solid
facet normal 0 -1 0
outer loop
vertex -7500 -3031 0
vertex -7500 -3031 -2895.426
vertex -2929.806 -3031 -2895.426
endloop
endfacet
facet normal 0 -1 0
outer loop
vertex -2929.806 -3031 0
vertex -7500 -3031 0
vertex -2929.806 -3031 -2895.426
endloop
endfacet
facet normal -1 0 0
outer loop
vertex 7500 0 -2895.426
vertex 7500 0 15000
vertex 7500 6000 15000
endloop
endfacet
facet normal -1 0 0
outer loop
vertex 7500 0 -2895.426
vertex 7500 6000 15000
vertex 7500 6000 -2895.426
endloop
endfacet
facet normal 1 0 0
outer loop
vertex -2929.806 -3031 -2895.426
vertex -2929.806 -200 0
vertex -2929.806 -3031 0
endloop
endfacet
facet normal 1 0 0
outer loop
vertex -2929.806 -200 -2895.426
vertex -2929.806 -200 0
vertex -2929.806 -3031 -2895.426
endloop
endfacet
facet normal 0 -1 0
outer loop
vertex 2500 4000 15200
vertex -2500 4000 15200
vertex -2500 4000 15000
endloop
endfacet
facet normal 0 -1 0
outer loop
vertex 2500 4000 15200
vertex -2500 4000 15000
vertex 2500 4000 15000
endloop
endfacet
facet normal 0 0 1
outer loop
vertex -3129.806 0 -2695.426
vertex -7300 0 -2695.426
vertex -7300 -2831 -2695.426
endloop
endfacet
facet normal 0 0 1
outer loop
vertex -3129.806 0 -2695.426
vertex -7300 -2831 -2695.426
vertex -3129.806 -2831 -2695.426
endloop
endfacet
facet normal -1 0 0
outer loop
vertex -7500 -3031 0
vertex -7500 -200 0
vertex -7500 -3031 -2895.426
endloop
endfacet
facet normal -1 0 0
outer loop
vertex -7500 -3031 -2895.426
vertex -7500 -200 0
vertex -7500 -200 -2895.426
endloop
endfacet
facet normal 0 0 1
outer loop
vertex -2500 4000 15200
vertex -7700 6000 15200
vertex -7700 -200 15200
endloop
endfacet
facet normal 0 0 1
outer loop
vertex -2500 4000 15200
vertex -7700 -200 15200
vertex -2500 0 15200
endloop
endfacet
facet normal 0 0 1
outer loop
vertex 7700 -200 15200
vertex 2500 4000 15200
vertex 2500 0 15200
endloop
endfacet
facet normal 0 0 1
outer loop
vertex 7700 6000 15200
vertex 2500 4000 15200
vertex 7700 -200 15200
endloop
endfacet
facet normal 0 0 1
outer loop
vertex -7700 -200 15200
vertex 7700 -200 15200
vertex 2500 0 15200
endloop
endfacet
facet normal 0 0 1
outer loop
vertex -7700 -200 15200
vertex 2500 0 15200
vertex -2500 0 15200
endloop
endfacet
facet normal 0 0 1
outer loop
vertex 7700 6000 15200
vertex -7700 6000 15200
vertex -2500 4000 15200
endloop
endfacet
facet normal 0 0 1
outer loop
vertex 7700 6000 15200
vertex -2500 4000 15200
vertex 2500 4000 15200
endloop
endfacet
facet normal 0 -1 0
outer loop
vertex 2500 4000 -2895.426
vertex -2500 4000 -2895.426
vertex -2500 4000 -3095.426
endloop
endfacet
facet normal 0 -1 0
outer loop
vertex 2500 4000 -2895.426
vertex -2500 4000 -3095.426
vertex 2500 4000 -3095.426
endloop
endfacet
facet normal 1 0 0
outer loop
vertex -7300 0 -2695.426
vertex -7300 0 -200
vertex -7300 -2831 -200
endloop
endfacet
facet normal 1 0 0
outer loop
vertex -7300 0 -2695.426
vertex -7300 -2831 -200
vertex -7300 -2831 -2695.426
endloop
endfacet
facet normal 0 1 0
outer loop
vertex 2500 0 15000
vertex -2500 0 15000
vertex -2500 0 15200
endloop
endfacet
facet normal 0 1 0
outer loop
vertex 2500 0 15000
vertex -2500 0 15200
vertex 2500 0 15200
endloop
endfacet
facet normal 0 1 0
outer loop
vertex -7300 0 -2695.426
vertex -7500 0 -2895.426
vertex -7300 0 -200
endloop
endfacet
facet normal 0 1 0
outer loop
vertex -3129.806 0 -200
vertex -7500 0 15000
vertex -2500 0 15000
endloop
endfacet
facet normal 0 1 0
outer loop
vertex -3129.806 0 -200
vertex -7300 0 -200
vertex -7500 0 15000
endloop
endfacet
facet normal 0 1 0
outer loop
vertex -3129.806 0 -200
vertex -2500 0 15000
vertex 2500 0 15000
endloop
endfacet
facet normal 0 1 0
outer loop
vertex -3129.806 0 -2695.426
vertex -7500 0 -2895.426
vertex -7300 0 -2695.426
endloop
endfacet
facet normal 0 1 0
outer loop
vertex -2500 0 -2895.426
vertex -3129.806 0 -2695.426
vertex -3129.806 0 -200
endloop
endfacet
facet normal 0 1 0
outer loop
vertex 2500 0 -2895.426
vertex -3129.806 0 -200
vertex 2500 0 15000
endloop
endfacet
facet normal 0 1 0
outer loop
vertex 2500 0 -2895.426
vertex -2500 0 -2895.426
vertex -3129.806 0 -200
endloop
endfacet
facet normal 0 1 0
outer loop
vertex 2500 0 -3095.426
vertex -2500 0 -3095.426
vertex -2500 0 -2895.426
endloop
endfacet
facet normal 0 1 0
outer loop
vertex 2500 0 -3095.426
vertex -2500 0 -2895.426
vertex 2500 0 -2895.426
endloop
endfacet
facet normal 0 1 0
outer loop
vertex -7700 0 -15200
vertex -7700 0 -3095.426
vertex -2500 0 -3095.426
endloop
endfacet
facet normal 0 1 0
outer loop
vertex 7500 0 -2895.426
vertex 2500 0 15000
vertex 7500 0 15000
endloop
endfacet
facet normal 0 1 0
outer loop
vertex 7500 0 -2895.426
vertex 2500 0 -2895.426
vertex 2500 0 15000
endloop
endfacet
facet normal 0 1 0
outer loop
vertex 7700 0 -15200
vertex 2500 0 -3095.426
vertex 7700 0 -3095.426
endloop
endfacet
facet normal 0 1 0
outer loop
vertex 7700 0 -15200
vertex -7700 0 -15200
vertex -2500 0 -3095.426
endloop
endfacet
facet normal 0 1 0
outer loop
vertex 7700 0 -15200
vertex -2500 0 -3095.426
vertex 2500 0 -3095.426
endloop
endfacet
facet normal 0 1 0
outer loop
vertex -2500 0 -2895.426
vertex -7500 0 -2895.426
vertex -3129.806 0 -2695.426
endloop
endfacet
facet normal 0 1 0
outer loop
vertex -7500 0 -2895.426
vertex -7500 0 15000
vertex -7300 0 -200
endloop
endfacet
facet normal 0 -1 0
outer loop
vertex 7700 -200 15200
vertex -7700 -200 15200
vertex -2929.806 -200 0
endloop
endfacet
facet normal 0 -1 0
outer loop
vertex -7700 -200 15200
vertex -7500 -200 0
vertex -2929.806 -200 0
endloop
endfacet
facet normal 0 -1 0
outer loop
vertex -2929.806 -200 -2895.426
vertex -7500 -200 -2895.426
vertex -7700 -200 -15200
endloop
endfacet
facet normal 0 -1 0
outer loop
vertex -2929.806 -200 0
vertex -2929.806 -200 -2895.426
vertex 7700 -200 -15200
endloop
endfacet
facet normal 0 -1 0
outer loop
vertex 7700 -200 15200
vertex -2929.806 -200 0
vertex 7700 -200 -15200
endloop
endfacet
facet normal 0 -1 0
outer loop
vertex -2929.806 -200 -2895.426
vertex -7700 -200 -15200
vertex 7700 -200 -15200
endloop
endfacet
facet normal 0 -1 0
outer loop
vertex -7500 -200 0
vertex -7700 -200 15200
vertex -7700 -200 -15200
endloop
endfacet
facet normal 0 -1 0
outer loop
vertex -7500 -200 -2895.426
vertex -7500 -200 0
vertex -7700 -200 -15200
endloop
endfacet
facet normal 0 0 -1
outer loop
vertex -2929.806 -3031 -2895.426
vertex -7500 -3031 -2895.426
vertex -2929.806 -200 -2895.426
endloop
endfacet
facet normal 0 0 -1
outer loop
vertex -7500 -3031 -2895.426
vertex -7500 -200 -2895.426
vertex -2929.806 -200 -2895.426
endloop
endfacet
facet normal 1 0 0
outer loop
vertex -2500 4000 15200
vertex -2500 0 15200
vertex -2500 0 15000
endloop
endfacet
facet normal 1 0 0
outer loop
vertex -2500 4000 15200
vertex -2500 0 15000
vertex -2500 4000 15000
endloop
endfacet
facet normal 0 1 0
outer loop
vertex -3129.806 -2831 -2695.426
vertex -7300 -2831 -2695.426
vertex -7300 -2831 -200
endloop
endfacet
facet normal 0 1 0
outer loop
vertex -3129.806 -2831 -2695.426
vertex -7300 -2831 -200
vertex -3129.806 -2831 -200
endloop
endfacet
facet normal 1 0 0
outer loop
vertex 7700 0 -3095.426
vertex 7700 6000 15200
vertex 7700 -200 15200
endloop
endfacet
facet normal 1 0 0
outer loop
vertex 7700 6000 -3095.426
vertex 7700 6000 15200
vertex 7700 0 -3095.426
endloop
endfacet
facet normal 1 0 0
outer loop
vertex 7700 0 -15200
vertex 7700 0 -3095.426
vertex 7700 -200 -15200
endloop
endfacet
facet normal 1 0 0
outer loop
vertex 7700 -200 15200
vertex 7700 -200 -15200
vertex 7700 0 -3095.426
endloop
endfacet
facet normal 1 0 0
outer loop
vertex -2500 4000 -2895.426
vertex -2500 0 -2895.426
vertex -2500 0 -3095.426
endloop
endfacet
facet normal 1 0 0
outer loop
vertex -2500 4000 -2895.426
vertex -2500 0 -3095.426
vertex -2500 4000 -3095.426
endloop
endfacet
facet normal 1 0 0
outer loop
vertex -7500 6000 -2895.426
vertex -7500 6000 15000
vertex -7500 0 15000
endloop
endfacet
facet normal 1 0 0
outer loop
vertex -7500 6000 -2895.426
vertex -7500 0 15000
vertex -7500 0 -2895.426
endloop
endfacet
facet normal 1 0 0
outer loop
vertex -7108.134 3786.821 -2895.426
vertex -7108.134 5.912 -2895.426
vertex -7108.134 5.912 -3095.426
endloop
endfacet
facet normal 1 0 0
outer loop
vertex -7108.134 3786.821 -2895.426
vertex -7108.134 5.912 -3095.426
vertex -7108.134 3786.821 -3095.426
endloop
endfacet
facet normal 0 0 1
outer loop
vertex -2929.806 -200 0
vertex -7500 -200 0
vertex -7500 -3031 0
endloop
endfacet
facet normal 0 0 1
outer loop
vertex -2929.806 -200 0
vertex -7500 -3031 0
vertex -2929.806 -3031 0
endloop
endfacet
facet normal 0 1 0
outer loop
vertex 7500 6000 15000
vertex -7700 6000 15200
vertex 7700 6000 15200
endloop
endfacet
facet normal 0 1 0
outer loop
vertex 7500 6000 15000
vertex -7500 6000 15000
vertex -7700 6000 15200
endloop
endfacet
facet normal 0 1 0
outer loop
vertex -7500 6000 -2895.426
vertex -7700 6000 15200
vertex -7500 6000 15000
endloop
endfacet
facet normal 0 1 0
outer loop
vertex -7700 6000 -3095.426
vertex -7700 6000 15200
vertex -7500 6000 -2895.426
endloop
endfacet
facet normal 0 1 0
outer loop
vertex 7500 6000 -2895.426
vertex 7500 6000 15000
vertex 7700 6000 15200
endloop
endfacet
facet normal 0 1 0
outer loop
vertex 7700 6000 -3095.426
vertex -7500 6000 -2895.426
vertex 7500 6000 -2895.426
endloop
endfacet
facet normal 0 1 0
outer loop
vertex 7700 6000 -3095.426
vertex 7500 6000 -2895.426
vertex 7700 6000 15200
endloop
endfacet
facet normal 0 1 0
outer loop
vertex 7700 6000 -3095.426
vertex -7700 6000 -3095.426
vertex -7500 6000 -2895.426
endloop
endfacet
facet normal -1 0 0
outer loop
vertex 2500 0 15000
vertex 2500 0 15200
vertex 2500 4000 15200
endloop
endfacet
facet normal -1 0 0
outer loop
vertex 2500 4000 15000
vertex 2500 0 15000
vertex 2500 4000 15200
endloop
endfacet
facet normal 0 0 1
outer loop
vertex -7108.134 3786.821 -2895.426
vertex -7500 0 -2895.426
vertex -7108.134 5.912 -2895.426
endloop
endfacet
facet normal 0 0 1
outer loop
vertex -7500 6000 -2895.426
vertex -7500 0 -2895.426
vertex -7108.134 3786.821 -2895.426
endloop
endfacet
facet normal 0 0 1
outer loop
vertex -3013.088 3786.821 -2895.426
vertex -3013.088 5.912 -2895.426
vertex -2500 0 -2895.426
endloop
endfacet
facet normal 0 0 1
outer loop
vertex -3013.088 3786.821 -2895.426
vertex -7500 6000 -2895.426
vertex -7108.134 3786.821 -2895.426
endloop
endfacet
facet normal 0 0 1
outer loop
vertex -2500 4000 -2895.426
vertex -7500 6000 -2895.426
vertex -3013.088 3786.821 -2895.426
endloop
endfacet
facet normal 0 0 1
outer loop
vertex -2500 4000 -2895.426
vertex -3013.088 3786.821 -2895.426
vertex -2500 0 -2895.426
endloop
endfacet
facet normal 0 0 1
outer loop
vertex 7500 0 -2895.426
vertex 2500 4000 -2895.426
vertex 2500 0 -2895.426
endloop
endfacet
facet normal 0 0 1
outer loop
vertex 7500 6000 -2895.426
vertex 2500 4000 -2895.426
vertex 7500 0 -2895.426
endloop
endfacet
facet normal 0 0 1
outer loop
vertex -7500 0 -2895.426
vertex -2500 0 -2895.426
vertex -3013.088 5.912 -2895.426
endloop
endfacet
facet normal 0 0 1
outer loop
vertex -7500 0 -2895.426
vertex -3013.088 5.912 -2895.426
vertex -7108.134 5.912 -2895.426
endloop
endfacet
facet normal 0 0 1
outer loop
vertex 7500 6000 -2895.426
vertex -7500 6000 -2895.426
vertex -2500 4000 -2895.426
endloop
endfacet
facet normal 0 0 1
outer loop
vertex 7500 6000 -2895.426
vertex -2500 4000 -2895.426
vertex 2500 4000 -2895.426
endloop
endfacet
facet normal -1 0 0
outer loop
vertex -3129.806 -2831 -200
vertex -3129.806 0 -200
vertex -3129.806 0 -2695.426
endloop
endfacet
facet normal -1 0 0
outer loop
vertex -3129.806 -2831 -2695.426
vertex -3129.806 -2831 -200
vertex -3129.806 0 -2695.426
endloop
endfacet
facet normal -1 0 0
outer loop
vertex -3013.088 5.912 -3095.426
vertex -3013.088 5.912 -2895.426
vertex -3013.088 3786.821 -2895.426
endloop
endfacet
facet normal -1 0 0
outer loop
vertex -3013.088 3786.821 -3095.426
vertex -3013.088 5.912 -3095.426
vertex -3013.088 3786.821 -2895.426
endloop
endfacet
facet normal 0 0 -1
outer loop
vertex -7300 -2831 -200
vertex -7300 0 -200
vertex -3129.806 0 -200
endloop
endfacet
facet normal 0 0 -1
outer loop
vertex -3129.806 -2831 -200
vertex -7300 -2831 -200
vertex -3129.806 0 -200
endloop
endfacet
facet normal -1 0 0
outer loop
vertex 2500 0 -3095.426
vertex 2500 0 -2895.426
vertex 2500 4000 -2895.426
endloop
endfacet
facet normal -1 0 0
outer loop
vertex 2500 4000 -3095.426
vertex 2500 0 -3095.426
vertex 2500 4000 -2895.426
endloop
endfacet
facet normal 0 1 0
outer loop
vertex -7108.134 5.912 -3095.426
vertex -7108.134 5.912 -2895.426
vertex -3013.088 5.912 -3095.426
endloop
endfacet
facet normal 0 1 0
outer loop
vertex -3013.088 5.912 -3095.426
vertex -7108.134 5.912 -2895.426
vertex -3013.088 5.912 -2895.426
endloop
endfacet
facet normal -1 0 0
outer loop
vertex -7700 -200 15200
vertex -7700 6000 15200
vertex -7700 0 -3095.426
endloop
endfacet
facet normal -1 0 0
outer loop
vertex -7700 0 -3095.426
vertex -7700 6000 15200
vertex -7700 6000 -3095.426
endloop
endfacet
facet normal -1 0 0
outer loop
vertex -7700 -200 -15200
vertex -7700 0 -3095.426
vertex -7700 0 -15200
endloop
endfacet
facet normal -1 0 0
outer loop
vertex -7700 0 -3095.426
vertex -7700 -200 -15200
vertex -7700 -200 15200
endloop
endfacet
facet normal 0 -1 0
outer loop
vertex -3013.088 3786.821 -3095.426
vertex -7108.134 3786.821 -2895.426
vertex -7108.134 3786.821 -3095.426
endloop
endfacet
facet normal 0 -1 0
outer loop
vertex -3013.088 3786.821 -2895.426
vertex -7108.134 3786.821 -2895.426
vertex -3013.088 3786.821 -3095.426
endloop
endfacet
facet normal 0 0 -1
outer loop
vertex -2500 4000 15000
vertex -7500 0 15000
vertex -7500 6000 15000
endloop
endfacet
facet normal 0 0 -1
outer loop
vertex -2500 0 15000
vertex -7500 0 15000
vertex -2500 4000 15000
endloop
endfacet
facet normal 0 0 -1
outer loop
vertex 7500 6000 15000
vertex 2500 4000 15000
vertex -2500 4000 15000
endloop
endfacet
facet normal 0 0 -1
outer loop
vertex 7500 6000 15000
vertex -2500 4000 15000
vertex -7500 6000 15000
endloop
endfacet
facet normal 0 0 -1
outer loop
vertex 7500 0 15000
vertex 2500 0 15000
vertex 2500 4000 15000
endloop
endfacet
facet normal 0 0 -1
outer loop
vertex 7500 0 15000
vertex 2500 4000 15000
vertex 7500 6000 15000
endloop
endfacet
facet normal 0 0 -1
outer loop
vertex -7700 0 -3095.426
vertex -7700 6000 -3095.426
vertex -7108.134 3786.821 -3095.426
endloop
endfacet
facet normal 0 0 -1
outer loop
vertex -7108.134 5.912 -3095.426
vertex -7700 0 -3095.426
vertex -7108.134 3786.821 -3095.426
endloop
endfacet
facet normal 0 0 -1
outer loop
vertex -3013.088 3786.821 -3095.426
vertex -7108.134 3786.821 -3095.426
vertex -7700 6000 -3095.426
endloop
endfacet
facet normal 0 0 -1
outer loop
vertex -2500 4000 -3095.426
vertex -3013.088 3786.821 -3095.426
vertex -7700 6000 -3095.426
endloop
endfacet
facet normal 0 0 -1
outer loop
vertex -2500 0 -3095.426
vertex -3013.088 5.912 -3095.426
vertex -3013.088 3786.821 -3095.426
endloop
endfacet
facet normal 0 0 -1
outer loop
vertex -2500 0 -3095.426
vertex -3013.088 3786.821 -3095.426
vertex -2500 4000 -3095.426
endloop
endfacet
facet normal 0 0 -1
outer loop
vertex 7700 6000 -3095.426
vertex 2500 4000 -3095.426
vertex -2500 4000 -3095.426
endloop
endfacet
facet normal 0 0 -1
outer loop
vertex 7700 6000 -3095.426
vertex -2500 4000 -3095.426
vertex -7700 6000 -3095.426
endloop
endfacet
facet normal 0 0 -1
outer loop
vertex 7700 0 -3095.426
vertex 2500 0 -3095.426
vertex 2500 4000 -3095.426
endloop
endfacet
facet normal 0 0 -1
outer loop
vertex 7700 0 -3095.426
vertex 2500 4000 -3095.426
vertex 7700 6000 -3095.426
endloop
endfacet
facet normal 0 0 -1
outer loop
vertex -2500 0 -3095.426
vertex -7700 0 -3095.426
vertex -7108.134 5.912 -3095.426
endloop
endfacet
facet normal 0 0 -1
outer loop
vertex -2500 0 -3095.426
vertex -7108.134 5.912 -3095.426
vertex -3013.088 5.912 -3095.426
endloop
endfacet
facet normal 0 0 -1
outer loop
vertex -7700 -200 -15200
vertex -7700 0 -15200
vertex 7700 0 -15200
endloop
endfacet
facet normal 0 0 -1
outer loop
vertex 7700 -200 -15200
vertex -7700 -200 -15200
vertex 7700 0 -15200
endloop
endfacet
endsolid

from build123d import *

# Parameters (mm, degrees)
CROQUIS2_W              = 15400
CROQUIS2_H              = 30400
CROQUIS2_W_2            = 15000
CROQUIS2_H_2            = 30000
CROQUIS2_H_3            = 200
SALIENTE_EXTRUIR1_DEPTH = 6000
CROQUIS2_2_W            = 15400
CROQUIS2_2_H            = 30400
CROQUIS2_2_W_2          = 15000
CROQUIS2_2_H_2          = 30000
CROQUIS2_2_H_3          = 11904.574403382
CROQUIS2_2_H_4          = 17895.425596618
CROQUIS2_2_H_5          = 200
SALIENTE_EXTRUIR2_DEPTH = 200
CROQUIS5_W              = 5000
CROQUIS5_H              = 4000
CORTAR_EXTRUIR1_DEPTH   = 31929.827100287
CROQUIS6_W              = 4570.193925868
CROQUIS6_H              = 2895.425596618
CROQUIS6_W_2            = 4170.193925868
CROQUIS6_H_2            = 2495.425596618
CORTAR_EXTRUIR2_DEPTH   = 18065.606278577
CROQUIS6_3_W            = 4570.193925868
CROQUIS6_3_H            = 2895.425596618
CROQUIS6_3_W_2          = 4170.193925868
CROQUIS6_3_H_2          = 2495.425596618
SALIENTE_EXTRUIR3_DEPTH = 2831
SALIENTE_EXTRUIR4_START = -2831
CROQUIS6_5_W            = 4570.193925868
CROQUIS6_5_H            = 2895.425596618
SALIENTE_EXTRUIR4_DEPTH = 200
CROQUIS7_W              = 4095.045838221
CROQUIS7_H              = 3780.908255671
CORTAR_EXTRUIR3_DEPTH   = 562
CROQUIS8_W              = 25320.425141551
CROQUIS8_H              = 14574.739237939
CORTAR_EXTRUIR4_DEPTH   = 19500


with BuildPart() as part:
    # Croquis2 → Saliente-Extruir1 (new body)
    # profile 1 of 2: a face of its own
    with BuildSketch(Plane(origin=(0, 0, 0), x_dir=(1, 0, 0), z_dir=(0, 1, 0))):
        Rectangle(CROQUIS2_W, CROQUIS2_H)
        Rectangle(CROQUIS2_W_2, CROQUIS2_H_2, mode=Mode.SUBTRACT)
    # profile 2 of 2: a face of its own
    with BuildSketch(Plane(origin=(0, 0, 0), x_dir=(1, 0, 0), z_dir=(0, 1, 0))):
        with Locations((0, 2995.425596618)):
            Rectangle(CROQUIS2_W_2, CROQUIS2_H_3)
    extrude(amount=SALIENTE_EXTRUIR1_DEPTH)

    # Croquis2<2> → Saliente-Extruir2 (add)
    # profile 1 of 4: a face of its own
    with BuildSketch(Plane(origin=(0, 0, 0), x_dir=(1, 0, 0), z_dir=(0, 1, 0))):
        Rectangle(CROQUIS2_2_W, CROQUIS2_2_H)
        Rectangle(CROQUIS2_2_W_2, CROQUIS2_2_H_2, mode=Mode.SUBTRACT)
    # profile 2 of 4: a face of its own
    with BuildSketch(Plane(origin=(0, 0, 0), x_dir=(1, 0, 0), z_dir=(0, 1, 0))):
        with Locations((0, 9047.712798309)):
            Rectangle(CROQUIS2_2_W_2, CROQUIS2_2_H_3)
    # profile 3 of 4: a face of its own
    with BuildSketch(Plane(origin=(0, 0, 0), x_dir=(1, 0, 0), z_dir=(0, 1, 0))):
        with Locations((0, -6052.287201691)):
            Rectangle(CROQUIS2_2_W_2, CROQUIS2_2_H_4)
    # profile 4 of 4: a face of its own
    with BuildSketch(Plane(origin=(0, 0, 0), x_dir=(1, 0, 0), z_dir=(0, 1, 0))):
        with Locations((0, 2995.425596618)):
            Rectangle(CROQUIS2_2_W_2, CROQUIS2_2_H_5)
    extrude(amount=-SALIENTE_EXTRUIR2_DEPTH)

    # Croquis5 → Cortar-Extruir1 (cut, through all)
    with BuildSketch(Plane.XY.offset(15200)):
        with Locations((0, 2000)):
            Rectangle(CROQUIS5_W, CROQUIS5_H)
    extrude(amount=-CORTAR_EXTRUIR1_DEPTH, mode=Mode.SUBTRACT)

    # Croquis6 → Cortar-Extruir2 (cut, through all)
    with BuildSketch(Plane(origin=(0, 0, 0), x_dir=(1, 0, 0), z_dir=(0, 1, 0))):
        with Locations((-5214.903037066, 1447.712798309)):
            Rectangle(CROQUIS6_W, CROQUIS6_H)
        with Locations((-5214.903037066, 1447.712798309)):
            Rectangle(CROQUIS6_W_2, CROQUIS6_H_2, mode=Mode.SUBTRACT)
    extrude(amount=-CORTAR_EXTRUIR2_DEPTH, mode=Mode.SUBTRACT)


with BuildPart() as cortar_extruir2_kept_piece:
    # of the separate pieces the step leaves, the one the design keeps (cortar_extruir2_pieces_kept)
    add(part.part.solids().sort_by_distance((-7700, 6000, -15200))[0])

    # Croquis6<3> → Saliente-Extruir3 (add)
    with BuildSketch(Plane(origin=(0, 0, 0), x_dir=(1, 0, 0), z_dir=(0, 1, 0))):
        with Locations((-5214.903037066, 1447.712798309)):
            Rectangle(CROQUIS6_3_W, CROQUIS6_3_H)
        with Locations((-5214.903037066, 1447.712798309)):
            Rectangle(CROQUIS6_3_W_2, CROQUIS6_3_H_2, mode=Mode.SUBTRACT)
    extrude(amount=-SALIENTE_EXTRUIR3_DEPTH)

    # Croquis6<5> → Saliente-Extruir4 (add)
    with BuildSketch(Plane(origin=(0, 0, 0), x_dir=(1, 0, 0), z_dir=(0, 1, 0)).offset(SALIENTE_EXTRUIR4_START)):
        with Locations((-5214.903037066, 1447.712798309)):
            Rectangle(CROQUIS6_5_W, CROQUIS6_5_H)
    extrude(amount=-SALIENTE_EXTRUIR4_DEPTH)

    # Croquis7 → Cortar-Extruir3 (cut)
    with BuildSketch(Plane.XY.offset(-2895.425596618)):
        with Locations((-5060.611397561, 1896.366414305)):
            Rectangle(CROQUIS7_W, CROQUIS7_H)
    extrude(amount=-CORTAR_EXTRUIR3_DEPTH, mode=Mode.SUBTRACT)

    # Croquis8 → Cortar-Extruir4 (cut)
    with BuildSketch(Plane(origin=(0, 0, 0), x_dir=(1, 0, 0), z_dir=(0, 1, 0))):
        with Locations((1266.213821781, 10382.795215588)):
            Rectangle(CROQUIS8_W, CROQUIS8_H)
    extrude(amount=CORTAR_EXTRUIR4_DEPTH, mode=Mode.SUBTRACT)


solid = cortar_extruir2_kept_piece.part
